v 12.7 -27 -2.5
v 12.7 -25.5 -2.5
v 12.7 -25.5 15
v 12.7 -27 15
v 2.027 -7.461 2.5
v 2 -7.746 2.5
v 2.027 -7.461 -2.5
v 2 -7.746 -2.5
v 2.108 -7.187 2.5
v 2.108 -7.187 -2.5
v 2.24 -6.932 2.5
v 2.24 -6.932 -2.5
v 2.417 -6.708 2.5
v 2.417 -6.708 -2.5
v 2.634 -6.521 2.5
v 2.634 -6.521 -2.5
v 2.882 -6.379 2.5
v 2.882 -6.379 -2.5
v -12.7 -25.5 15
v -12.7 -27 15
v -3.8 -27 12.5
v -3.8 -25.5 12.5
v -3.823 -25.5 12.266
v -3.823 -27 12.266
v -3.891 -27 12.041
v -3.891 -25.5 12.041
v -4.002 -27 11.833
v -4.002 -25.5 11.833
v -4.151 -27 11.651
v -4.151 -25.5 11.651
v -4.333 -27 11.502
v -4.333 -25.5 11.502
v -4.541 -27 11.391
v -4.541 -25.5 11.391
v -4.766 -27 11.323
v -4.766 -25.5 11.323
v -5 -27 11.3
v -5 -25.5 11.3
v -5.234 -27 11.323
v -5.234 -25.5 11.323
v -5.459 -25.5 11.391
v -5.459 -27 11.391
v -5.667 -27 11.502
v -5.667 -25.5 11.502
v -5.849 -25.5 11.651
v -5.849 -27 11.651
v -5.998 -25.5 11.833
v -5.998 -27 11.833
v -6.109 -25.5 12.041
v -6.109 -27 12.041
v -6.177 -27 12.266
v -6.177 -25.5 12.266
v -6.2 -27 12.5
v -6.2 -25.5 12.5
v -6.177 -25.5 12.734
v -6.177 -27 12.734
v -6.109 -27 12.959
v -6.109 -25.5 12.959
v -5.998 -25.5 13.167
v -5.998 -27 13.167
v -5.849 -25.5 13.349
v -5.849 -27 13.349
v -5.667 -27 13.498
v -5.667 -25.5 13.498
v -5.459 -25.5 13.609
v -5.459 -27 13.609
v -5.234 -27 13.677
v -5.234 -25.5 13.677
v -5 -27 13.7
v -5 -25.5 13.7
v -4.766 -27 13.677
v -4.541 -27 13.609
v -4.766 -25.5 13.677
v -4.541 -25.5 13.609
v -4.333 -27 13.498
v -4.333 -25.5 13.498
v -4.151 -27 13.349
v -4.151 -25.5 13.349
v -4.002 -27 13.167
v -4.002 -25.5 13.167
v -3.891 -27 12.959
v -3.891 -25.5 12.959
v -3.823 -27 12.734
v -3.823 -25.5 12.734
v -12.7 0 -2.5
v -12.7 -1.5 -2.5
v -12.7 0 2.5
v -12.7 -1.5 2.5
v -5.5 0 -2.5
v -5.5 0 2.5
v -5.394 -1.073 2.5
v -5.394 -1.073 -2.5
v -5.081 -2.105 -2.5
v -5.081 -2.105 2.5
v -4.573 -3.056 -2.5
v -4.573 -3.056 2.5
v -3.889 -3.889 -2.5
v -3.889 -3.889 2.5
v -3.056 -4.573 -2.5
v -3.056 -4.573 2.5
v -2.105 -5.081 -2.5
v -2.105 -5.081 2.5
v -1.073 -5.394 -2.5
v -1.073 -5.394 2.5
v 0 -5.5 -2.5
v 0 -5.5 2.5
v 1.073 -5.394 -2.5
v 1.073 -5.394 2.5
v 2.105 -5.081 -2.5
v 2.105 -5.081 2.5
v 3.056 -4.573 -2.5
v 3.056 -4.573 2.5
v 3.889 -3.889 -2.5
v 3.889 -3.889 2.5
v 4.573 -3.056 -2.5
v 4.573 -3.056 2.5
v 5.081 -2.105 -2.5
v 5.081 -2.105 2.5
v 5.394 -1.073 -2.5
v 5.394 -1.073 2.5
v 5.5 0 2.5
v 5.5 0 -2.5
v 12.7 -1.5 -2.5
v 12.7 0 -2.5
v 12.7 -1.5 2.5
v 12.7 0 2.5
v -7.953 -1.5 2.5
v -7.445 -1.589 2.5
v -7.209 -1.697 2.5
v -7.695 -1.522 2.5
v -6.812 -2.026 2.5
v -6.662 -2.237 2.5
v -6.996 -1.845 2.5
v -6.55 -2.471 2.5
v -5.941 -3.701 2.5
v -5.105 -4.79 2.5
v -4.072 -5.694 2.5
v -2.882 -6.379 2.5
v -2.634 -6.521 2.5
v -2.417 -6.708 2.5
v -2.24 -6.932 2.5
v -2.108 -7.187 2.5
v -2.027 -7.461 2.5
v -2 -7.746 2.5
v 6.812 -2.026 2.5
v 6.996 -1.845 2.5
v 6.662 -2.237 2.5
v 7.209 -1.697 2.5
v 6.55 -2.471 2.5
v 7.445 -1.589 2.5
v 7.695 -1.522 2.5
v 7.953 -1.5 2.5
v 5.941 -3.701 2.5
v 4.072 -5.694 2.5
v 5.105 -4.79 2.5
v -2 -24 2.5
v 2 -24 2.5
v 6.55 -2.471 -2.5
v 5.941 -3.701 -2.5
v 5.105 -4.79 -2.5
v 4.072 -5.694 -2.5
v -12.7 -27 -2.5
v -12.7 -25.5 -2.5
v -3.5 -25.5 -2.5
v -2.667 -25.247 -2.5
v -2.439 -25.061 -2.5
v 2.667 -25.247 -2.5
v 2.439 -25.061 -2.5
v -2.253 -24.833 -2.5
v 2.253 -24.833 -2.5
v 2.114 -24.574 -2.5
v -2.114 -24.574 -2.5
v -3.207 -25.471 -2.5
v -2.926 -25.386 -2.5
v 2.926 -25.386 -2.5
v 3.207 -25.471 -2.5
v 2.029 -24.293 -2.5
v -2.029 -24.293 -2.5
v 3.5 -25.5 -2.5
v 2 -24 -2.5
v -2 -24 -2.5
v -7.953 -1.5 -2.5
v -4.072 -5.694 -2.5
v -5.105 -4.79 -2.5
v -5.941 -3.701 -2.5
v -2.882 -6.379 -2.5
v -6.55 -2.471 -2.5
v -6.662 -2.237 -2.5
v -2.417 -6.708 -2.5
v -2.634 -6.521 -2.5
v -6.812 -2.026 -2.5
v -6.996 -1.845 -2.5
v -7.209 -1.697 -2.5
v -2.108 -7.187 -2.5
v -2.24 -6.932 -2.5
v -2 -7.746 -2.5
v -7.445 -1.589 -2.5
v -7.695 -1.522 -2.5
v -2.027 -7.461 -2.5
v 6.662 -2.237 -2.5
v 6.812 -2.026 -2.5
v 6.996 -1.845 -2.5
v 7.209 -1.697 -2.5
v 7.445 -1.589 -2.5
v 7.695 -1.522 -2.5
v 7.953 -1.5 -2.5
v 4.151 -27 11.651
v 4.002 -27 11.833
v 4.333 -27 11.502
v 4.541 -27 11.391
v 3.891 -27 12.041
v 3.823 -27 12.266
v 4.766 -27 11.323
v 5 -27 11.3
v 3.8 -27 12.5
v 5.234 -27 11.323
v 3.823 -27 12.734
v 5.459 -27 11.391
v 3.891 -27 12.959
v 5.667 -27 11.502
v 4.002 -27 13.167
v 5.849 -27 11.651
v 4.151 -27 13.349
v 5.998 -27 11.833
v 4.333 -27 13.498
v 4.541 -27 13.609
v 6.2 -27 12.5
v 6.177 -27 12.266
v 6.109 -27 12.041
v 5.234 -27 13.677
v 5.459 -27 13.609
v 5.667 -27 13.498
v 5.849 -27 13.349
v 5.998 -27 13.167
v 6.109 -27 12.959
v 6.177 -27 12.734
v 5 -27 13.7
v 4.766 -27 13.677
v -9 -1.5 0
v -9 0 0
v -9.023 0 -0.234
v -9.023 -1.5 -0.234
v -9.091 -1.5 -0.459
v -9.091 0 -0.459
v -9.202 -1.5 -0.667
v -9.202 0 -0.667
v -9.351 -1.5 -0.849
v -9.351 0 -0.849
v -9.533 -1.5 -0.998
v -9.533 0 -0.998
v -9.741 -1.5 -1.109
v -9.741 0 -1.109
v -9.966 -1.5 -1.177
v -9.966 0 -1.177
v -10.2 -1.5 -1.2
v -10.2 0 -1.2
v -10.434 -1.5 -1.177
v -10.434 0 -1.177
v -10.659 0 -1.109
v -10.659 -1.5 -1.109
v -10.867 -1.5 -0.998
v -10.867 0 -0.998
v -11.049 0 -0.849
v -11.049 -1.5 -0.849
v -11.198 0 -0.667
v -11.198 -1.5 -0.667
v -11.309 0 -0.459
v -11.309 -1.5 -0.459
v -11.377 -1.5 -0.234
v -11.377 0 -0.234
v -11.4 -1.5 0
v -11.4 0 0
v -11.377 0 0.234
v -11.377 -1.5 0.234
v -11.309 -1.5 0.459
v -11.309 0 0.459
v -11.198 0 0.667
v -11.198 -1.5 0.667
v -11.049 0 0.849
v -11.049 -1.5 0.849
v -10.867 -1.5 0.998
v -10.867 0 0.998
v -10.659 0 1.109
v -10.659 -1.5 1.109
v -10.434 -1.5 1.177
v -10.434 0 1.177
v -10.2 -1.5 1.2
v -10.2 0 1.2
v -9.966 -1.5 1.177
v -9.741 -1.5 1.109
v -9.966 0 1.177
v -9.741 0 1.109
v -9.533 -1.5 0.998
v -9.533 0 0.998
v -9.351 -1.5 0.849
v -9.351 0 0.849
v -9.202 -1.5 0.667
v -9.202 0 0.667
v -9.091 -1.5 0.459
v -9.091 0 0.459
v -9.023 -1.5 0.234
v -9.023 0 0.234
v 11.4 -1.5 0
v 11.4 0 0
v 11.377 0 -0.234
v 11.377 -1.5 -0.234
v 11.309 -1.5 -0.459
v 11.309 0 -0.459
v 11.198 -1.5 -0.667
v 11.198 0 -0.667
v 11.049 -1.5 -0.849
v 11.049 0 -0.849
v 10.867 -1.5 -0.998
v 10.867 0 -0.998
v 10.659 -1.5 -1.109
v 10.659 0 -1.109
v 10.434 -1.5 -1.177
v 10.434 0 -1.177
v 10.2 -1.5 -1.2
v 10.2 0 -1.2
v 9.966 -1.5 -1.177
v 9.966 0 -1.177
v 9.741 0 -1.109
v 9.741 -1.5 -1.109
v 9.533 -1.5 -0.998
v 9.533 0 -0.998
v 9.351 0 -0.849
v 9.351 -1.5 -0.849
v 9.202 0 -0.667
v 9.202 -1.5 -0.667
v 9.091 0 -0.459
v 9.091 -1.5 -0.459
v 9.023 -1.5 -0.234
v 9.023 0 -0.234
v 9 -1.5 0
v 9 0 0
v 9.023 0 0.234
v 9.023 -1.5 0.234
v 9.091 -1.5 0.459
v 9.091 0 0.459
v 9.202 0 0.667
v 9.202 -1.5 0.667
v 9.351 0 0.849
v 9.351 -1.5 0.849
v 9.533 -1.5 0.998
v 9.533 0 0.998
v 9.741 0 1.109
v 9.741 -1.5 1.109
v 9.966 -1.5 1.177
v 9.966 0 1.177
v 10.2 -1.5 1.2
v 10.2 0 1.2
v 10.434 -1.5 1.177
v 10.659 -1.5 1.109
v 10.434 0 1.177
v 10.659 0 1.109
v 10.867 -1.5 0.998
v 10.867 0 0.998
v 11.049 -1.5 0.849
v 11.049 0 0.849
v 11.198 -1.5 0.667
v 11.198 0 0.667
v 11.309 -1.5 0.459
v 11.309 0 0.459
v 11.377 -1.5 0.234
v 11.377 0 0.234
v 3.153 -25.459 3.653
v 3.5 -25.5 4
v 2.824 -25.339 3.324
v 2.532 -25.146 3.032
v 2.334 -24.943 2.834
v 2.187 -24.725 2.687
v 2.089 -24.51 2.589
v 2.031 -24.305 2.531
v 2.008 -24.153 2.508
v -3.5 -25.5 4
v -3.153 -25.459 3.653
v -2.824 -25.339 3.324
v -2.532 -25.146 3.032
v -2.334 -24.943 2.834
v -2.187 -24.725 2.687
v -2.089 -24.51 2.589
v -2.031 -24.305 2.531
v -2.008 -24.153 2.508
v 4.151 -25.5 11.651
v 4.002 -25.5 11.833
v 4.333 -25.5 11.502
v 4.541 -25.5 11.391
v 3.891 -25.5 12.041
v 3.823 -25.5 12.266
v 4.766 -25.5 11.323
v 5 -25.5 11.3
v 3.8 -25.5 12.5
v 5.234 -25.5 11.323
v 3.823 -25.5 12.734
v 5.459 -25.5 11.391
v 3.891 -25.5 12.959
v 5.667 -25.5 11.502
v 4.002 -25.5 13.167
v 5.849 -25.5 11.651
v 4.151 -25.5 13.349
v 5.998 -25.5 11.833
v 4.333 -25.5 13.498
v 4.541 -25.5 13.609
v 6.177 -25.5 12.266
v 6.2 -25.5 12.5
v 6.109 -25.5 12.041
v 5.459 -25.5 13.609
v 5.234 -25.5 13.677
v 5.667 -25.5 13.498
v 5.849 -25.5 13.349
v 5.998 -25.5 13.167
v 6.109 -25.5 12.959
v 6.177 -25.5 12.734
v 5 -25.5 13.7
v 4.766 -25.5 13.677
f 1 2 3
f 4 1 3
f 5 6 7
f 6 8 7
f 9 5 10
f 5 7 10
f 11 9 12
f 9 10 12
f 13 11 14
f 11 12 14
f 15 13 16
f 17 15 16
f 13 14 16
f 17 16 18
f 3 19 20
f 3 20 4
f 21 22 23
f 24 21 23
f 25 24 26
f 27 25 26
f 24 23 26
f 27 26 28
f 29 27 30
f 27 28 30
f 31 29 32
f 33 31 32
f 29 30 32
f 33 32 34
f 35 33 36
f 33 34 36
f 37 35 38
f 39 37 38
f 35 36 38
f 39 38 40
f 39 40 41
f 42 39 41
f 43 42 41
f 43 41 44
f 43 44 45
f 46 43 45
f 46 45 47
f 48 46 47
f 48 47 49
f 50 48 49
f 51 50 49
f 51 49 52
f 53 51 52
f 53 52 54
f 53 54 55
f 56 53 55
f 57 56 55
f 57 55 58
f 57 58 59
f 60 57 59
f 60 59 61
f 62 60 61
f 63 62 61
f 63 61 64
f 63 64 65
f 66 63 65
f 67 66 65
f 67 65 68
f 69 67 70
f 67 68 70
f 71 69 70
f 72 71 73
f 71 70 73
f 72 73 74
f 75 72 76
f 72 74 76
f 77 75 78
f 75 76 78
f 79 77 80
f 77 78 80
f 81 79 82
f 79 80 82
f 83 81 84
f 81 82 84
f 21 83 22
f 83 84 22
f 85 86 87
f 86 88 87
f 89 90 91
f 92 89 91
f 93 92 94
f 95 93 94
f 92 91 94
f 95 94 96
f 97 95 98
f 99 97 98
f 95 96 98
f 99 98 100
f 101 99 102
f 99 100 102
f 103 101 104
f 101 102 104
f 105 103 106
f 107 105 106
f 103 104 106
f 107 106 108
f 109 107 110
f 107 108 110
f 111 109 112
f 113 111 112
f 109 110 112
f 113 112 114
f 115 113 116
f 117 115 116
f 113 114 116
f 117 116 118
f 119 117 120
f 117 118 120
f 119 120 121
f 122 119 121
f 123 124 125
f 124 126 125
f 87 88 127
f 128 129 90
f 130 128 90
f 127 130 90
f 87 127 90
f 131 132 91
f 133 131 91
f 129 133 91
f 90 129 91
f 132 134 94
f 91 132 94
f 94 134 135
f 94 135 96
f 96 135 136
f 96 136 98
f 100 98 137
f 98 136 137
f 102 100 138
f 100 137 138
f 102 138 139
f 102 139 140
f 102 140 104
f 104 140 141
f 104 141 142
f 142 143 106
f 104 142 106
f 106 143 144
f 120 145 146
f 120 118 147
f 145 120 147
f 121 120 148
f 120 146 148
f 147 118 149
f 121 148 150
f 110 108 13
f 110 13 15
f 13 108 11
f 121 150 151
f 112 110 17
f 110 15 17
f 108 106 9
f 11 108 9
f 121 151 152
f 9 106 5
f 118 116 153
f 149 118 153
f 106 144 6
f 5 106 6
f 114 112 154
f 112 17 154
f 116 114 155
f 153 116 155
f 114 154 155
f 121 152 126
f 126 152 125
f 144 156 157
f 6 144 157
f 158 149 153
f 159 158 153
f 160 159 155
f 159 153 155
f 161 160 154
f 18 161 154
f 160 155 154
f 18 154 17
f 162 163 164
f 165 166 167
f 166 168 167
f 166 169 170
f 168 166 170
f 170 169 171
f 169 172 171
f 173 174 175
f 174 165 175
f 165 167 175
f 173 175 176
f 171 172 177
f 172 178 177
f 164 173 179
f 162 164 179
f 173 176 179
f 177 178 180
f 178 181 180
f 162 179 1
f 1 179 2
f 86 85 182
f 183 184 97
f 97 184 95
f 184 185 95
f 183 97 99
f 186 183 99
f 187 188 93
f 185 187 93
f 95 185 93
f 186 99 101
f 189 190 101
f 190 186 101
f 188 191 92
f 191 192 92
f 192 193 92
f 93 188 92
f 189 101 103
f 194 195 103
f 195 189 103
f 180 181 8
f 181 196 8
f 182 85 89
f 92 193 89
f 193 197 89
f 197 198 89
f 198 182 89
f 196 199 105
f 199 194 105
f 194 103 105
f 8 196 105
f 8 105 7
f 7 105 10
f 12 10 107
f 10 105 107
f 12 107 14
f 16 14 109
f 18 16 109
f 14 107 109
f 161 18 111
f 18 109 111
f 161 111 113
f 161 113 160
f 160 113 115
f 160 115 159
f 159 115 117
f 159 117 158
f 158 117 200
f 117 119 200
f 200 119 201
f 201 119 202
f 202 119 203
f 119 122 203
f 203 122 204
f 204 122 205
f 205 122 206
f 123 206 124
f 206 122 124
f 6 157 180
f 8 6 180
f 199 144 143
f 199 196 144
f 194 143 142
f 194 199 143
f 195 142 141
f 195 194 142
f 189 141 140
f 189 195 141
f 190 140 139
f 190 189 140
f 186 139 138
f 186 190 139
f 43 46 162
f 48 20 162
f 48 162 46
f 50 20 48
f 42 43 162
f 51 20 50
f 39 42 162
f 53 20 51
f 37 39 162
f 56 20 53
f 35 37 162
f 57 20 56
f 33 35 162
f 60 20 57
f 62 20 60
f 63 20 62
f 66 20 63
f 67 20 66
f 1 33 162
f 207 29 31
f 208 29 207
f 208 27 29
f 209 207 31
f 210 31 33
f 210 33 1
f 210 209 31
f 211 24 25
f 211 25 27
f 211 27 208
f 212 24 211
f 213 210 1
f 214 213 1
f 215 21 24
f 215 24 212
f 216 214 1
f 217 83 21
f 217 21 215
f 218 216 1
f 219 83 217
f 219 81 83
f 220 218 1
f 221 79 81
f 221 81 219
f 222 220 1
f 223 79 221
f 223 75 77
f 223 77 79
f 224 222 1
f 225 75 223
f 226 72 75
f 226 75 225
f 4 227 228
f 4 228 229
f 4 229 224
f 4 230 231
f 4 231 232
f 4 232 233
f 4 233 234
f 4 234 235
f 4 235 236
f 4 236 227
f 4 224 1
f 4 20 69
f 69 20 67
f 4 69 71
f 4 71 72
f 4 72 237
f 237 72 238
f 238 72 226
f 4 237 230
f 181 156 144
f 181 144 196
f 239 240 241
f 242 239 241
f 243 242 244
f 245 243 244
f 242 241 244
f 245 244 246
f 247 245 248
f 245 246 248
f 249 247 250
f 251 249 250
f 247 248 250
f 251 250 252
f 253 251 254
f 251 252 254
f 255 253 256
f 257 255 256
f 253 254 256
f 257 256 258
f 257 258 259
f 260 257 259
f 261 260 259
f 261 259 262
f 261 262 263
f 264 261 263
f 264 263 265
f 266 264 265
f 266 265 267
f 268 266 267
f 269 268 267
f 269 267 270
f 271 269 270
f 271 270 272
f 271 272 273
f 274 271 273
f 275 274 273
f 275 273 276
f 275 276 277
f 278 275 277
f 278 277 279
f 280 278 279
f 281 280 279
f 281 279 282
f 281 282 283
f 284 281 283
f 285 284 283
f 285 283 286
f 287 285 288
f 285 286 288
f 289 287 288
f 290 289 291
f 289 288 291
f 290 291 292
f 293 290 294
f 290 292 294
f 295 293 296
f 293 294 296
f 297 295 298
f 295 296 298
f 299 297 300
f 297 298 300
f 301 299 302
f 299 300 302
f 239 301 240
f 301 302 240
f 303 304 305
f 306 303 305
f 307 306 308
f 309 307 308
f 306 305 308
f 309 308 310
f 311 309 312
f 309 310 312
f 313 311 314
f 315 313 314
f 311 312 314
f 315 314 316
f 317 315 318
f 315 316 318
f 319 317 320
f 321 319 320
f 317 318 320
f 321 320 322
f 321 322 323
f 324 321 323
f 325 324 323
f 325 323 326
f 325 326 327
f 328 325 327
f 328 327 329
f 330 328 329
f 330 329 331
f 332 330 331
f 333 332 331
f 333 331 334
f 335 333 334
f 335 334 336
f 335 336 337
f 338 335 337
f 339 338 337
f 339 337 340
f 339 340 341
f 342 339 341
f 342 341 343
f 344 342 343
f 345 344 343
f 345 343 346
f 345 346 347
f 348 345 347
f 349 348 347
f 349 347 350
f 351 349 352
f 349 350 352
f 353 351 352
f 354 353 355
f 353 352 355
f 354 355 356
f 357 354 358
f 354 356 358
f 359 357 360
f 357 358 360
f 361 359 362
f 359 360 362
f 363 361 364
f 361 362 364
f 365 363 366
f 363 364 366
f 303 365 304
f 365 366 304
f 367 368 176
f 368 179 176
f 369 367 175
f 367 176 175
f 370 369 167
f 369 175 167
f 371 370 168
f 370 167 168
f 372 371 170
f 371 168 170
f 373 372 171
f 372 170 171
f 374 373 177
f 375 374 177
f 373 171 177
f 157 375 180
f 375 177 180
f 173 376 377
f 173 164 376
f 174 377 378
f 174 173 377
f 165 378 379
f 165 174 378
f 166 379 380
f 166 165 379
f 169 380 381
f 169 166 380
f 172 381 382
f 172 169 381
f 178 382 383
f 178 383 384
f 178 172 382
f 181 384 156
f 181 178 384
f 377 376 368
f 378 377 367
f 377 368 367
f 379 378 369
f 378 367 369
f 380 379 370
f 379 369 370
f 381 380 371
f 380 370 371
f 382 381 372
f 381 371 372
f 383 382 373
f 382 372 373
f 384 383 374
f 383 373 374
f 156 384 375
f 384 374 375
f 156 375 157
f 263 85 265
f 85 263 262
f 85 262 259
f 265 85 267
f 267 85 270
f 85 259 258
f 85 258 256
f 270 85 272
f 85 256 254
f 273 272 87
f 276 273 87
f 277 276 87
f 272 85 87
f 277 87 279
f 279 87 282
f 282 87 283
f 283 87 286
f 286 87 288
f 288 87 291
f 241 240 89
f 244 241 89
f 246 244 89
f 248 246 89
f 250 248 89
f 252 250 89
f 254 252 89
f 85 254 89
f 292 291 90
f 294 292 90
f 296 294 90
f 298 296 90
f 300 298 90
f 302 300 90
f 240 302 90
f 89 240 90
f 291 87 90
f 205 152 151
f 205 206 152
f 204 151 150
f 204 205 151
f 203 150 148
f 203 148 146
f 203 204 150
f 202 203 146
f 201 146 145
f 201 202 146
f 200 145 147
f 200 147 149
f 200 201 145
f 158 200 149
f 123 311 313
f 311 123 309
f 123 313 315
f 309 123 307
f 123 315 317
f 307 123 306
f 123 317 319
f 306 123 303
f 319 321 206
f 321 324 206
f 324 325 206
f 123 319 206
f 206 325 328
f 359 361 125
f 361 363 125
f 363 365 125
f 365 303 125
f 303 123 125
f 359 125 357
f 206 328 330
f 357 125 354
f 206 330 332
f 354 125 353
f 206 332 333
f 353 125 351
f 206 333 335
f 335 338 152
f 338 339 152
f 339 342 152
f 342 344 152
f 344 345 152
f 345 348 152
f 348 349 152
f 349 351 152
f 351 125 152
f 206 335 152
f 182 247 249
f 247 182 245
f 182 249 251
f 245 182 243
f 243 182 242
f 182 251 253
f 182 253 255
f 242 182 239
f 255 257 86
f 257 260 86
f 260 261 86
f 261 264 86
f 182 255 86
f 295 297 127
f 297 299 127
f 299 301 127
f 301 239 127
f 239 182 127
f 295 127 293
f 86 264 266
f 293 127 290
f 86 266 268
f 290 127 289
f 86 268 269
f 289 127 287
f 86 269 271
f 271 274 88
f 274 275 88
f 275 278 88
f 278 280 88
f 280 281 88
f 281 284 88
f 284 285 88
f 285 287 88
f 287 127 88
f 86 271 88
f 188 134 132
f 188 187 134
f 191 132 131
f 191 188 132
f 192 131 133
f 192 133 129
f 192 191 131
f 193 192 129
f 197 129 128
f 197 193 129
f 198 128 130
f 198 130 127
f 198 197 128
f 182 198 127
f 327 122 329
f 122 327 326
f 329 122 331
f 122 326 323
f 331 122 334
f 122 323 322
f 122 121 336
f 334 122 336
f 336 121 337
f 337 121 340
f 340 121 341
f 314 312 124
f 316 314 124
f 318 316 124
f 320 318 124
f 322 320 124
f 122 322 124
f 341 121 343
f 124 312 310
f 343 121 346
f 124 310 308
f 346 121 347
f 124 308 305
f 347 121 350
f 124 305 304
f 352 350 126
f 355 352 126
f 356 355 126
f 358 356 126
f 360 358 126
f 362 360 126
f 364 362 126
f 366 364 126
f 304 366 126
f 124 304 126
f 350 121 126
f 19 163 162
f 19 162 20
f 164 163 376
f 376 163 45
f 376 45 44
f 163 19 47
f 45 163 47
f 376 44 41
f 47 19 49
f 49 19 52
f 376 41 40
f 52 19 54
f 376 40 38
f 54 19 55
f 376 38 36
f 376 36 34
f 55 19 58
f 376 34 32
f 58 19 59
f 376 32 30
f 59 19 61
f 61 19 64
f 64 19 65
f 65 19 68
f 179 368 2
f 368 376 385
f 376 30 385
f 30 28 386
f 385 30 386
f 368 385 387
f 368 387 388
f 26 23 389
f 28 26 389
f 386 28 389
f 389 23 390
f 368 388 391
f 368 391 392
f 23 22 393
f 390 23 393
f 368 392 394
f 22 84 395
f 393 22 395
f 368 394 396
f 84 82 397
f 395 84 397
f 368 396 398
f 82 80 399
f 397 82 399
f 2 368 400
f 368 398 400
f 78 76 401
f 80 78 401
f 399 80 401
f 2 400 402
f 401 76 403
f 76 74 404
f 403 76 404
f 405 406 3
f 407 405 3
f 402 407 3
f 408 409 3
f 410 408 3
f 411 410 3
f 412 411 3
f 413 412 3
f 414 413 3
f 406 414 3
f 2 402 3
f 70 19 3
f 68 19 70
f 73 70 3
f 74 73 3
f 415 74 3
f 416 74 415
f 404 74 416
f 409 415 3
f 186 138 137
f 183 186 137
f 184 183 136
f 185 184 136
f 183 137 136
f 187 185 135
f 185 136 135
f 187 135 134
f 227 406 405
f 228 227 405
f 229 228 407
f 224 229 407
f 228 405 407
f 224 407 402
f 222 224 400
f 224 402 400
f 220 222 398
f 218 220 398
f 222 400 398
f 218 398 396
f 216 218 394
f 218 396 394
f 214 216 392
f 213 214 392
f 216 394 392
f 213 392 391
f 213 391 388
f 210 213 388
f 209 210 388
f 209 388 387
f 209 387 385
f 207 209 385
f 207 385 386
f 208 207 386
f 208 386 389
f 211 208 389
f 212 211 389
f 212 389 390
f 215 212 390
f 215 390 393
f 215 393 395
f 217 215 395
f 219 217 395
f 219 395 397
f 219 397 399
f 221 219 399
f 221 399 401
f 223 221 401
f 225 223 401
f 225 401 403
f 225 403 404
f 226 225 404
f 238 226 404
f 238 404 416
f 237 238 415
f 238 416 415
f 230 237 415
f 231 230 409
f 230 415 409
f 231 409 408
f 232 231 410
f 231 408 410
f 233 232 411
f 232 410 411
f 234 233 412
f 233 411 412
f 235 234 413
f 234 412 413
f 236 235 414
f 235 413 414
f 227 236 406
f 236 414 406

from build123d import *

# Parameters (mm, degrees)
BOSS_EXTRUDE1_DEPTH = 2.5
SKETCH2_R           = 1.2
CUT_EXTRUDE1_DEPTH  = 8
BOSS_EXTRUDE2_START = -25.5
SKETCH6_W           = 4
SKETCH6_H           = 5
BOSS_EXTRUDE2_DEPTH = 18.791796
SKETCH7_W           = 25.4
SKETCH7_H           = 17.5
BOSS_EXTRUDE4_DEPTH = 1.5
FILLET1_R           = 1.5
SKETCH8_R           = 1.2
CUT_EXTRUDE3_DEPTH  = 28


with BuildPart() as part:
    # Sketch1 → Boss-Extrude1 (new body, symmetric)
    with BuildSketch(Plane.XY):
        with BuildLine():
            Line((5.5, 0), (12.7, 0))
            Line((12.7, 0), (12.7, -1.5))
            Line((12.7, -1.5), (6.837397166, -1.5))
            ThreePointArc((6.837397166, -1.5), (0, -7), (-6.837397166, -1.5))
            Line((-6.837397166, -1.5), (-12.7, -1.5))
            Line((-12.7, -1.5), (-12.7, 0))
            Line((-12.7, 0), (-5.5, 0))
            ThreePointArc((-5.5, 0), (0, -5.5), (5.5, 0))
        make_face()
    extrude(amount=BOSS_EXTRUDE1_DEPTH, both=True)

    # Sketch2 → Cut-Extrude1 (cut, through all)
    with BuildSketch(Plane(origin=(0, 0, 0), x_dir=(1, 0, 0), z_dir=(0, 1, 0))):
        with Locations((-10.2, 0)):
            Circle(SKETCH2_R)
        with Locations((10.2, 0)):
            Circle(SKETCH2_R)
    extrude(amount=-CUT_EXTRUDE1_DEPTH, mode=Mode.SUBTRACT)

    # Sketch6 → Boss-Extrude2 (add)
    with BuildSketch(Plane(origin=(0, 0, 0), x_dir=(1, 0, 0), z_dir=(0, 1, 0)).offset(BOSS_EXTRUDE2_START)):
        Rectangle(SKETCH6_W, SKETCH6_H)
    extrude(amount=BOSS_EXTRUDE2_DEPTH)

    # Sketch7 → Boss-Extrude4 (add)
    with BuildSketch(Plane.XZ.offset(25.5)):
        with Locations((0, 6.25)):
            Rectangle(SKETCH7_W, SKETCH7_H)
    extrude(amount=BOSS_EXTRUDE4_DEPTH)

    # Fillet1
    fillet1_edges = [part.edges().sort_by_distance(p)[0] for p in [
        (6.837397166, -1.5, 0),
        (-6.837397166, -1.5, 0),
        (-2, -25.5, 0),
        (0, -25.5, 2.5),
        (2, -25.5, 0),
        (-2, -6.708204, 0),
        (2, -6.708204, 0),
    ]]
    fillet(fillet1_edges, radius=FILLET1_R)

    # Sketch8 → Cut-Extrude3 (cut, through all)
    with BuildSketch(Plane(origin=(0, 0, 0), x_dir=(1, 0, 0), z_dir=(0, 1, 0))):
        with Locations((-5, -12.5)):
            Circle(SKETCH8_R)
        with Locations((5, -12.5)):
            Circle(SKETCH8_R)
    extrude(amount=-CUT_EXTRUDE3_DEPTH, mode=Mode.SUBTRACT)


solid = part.part
